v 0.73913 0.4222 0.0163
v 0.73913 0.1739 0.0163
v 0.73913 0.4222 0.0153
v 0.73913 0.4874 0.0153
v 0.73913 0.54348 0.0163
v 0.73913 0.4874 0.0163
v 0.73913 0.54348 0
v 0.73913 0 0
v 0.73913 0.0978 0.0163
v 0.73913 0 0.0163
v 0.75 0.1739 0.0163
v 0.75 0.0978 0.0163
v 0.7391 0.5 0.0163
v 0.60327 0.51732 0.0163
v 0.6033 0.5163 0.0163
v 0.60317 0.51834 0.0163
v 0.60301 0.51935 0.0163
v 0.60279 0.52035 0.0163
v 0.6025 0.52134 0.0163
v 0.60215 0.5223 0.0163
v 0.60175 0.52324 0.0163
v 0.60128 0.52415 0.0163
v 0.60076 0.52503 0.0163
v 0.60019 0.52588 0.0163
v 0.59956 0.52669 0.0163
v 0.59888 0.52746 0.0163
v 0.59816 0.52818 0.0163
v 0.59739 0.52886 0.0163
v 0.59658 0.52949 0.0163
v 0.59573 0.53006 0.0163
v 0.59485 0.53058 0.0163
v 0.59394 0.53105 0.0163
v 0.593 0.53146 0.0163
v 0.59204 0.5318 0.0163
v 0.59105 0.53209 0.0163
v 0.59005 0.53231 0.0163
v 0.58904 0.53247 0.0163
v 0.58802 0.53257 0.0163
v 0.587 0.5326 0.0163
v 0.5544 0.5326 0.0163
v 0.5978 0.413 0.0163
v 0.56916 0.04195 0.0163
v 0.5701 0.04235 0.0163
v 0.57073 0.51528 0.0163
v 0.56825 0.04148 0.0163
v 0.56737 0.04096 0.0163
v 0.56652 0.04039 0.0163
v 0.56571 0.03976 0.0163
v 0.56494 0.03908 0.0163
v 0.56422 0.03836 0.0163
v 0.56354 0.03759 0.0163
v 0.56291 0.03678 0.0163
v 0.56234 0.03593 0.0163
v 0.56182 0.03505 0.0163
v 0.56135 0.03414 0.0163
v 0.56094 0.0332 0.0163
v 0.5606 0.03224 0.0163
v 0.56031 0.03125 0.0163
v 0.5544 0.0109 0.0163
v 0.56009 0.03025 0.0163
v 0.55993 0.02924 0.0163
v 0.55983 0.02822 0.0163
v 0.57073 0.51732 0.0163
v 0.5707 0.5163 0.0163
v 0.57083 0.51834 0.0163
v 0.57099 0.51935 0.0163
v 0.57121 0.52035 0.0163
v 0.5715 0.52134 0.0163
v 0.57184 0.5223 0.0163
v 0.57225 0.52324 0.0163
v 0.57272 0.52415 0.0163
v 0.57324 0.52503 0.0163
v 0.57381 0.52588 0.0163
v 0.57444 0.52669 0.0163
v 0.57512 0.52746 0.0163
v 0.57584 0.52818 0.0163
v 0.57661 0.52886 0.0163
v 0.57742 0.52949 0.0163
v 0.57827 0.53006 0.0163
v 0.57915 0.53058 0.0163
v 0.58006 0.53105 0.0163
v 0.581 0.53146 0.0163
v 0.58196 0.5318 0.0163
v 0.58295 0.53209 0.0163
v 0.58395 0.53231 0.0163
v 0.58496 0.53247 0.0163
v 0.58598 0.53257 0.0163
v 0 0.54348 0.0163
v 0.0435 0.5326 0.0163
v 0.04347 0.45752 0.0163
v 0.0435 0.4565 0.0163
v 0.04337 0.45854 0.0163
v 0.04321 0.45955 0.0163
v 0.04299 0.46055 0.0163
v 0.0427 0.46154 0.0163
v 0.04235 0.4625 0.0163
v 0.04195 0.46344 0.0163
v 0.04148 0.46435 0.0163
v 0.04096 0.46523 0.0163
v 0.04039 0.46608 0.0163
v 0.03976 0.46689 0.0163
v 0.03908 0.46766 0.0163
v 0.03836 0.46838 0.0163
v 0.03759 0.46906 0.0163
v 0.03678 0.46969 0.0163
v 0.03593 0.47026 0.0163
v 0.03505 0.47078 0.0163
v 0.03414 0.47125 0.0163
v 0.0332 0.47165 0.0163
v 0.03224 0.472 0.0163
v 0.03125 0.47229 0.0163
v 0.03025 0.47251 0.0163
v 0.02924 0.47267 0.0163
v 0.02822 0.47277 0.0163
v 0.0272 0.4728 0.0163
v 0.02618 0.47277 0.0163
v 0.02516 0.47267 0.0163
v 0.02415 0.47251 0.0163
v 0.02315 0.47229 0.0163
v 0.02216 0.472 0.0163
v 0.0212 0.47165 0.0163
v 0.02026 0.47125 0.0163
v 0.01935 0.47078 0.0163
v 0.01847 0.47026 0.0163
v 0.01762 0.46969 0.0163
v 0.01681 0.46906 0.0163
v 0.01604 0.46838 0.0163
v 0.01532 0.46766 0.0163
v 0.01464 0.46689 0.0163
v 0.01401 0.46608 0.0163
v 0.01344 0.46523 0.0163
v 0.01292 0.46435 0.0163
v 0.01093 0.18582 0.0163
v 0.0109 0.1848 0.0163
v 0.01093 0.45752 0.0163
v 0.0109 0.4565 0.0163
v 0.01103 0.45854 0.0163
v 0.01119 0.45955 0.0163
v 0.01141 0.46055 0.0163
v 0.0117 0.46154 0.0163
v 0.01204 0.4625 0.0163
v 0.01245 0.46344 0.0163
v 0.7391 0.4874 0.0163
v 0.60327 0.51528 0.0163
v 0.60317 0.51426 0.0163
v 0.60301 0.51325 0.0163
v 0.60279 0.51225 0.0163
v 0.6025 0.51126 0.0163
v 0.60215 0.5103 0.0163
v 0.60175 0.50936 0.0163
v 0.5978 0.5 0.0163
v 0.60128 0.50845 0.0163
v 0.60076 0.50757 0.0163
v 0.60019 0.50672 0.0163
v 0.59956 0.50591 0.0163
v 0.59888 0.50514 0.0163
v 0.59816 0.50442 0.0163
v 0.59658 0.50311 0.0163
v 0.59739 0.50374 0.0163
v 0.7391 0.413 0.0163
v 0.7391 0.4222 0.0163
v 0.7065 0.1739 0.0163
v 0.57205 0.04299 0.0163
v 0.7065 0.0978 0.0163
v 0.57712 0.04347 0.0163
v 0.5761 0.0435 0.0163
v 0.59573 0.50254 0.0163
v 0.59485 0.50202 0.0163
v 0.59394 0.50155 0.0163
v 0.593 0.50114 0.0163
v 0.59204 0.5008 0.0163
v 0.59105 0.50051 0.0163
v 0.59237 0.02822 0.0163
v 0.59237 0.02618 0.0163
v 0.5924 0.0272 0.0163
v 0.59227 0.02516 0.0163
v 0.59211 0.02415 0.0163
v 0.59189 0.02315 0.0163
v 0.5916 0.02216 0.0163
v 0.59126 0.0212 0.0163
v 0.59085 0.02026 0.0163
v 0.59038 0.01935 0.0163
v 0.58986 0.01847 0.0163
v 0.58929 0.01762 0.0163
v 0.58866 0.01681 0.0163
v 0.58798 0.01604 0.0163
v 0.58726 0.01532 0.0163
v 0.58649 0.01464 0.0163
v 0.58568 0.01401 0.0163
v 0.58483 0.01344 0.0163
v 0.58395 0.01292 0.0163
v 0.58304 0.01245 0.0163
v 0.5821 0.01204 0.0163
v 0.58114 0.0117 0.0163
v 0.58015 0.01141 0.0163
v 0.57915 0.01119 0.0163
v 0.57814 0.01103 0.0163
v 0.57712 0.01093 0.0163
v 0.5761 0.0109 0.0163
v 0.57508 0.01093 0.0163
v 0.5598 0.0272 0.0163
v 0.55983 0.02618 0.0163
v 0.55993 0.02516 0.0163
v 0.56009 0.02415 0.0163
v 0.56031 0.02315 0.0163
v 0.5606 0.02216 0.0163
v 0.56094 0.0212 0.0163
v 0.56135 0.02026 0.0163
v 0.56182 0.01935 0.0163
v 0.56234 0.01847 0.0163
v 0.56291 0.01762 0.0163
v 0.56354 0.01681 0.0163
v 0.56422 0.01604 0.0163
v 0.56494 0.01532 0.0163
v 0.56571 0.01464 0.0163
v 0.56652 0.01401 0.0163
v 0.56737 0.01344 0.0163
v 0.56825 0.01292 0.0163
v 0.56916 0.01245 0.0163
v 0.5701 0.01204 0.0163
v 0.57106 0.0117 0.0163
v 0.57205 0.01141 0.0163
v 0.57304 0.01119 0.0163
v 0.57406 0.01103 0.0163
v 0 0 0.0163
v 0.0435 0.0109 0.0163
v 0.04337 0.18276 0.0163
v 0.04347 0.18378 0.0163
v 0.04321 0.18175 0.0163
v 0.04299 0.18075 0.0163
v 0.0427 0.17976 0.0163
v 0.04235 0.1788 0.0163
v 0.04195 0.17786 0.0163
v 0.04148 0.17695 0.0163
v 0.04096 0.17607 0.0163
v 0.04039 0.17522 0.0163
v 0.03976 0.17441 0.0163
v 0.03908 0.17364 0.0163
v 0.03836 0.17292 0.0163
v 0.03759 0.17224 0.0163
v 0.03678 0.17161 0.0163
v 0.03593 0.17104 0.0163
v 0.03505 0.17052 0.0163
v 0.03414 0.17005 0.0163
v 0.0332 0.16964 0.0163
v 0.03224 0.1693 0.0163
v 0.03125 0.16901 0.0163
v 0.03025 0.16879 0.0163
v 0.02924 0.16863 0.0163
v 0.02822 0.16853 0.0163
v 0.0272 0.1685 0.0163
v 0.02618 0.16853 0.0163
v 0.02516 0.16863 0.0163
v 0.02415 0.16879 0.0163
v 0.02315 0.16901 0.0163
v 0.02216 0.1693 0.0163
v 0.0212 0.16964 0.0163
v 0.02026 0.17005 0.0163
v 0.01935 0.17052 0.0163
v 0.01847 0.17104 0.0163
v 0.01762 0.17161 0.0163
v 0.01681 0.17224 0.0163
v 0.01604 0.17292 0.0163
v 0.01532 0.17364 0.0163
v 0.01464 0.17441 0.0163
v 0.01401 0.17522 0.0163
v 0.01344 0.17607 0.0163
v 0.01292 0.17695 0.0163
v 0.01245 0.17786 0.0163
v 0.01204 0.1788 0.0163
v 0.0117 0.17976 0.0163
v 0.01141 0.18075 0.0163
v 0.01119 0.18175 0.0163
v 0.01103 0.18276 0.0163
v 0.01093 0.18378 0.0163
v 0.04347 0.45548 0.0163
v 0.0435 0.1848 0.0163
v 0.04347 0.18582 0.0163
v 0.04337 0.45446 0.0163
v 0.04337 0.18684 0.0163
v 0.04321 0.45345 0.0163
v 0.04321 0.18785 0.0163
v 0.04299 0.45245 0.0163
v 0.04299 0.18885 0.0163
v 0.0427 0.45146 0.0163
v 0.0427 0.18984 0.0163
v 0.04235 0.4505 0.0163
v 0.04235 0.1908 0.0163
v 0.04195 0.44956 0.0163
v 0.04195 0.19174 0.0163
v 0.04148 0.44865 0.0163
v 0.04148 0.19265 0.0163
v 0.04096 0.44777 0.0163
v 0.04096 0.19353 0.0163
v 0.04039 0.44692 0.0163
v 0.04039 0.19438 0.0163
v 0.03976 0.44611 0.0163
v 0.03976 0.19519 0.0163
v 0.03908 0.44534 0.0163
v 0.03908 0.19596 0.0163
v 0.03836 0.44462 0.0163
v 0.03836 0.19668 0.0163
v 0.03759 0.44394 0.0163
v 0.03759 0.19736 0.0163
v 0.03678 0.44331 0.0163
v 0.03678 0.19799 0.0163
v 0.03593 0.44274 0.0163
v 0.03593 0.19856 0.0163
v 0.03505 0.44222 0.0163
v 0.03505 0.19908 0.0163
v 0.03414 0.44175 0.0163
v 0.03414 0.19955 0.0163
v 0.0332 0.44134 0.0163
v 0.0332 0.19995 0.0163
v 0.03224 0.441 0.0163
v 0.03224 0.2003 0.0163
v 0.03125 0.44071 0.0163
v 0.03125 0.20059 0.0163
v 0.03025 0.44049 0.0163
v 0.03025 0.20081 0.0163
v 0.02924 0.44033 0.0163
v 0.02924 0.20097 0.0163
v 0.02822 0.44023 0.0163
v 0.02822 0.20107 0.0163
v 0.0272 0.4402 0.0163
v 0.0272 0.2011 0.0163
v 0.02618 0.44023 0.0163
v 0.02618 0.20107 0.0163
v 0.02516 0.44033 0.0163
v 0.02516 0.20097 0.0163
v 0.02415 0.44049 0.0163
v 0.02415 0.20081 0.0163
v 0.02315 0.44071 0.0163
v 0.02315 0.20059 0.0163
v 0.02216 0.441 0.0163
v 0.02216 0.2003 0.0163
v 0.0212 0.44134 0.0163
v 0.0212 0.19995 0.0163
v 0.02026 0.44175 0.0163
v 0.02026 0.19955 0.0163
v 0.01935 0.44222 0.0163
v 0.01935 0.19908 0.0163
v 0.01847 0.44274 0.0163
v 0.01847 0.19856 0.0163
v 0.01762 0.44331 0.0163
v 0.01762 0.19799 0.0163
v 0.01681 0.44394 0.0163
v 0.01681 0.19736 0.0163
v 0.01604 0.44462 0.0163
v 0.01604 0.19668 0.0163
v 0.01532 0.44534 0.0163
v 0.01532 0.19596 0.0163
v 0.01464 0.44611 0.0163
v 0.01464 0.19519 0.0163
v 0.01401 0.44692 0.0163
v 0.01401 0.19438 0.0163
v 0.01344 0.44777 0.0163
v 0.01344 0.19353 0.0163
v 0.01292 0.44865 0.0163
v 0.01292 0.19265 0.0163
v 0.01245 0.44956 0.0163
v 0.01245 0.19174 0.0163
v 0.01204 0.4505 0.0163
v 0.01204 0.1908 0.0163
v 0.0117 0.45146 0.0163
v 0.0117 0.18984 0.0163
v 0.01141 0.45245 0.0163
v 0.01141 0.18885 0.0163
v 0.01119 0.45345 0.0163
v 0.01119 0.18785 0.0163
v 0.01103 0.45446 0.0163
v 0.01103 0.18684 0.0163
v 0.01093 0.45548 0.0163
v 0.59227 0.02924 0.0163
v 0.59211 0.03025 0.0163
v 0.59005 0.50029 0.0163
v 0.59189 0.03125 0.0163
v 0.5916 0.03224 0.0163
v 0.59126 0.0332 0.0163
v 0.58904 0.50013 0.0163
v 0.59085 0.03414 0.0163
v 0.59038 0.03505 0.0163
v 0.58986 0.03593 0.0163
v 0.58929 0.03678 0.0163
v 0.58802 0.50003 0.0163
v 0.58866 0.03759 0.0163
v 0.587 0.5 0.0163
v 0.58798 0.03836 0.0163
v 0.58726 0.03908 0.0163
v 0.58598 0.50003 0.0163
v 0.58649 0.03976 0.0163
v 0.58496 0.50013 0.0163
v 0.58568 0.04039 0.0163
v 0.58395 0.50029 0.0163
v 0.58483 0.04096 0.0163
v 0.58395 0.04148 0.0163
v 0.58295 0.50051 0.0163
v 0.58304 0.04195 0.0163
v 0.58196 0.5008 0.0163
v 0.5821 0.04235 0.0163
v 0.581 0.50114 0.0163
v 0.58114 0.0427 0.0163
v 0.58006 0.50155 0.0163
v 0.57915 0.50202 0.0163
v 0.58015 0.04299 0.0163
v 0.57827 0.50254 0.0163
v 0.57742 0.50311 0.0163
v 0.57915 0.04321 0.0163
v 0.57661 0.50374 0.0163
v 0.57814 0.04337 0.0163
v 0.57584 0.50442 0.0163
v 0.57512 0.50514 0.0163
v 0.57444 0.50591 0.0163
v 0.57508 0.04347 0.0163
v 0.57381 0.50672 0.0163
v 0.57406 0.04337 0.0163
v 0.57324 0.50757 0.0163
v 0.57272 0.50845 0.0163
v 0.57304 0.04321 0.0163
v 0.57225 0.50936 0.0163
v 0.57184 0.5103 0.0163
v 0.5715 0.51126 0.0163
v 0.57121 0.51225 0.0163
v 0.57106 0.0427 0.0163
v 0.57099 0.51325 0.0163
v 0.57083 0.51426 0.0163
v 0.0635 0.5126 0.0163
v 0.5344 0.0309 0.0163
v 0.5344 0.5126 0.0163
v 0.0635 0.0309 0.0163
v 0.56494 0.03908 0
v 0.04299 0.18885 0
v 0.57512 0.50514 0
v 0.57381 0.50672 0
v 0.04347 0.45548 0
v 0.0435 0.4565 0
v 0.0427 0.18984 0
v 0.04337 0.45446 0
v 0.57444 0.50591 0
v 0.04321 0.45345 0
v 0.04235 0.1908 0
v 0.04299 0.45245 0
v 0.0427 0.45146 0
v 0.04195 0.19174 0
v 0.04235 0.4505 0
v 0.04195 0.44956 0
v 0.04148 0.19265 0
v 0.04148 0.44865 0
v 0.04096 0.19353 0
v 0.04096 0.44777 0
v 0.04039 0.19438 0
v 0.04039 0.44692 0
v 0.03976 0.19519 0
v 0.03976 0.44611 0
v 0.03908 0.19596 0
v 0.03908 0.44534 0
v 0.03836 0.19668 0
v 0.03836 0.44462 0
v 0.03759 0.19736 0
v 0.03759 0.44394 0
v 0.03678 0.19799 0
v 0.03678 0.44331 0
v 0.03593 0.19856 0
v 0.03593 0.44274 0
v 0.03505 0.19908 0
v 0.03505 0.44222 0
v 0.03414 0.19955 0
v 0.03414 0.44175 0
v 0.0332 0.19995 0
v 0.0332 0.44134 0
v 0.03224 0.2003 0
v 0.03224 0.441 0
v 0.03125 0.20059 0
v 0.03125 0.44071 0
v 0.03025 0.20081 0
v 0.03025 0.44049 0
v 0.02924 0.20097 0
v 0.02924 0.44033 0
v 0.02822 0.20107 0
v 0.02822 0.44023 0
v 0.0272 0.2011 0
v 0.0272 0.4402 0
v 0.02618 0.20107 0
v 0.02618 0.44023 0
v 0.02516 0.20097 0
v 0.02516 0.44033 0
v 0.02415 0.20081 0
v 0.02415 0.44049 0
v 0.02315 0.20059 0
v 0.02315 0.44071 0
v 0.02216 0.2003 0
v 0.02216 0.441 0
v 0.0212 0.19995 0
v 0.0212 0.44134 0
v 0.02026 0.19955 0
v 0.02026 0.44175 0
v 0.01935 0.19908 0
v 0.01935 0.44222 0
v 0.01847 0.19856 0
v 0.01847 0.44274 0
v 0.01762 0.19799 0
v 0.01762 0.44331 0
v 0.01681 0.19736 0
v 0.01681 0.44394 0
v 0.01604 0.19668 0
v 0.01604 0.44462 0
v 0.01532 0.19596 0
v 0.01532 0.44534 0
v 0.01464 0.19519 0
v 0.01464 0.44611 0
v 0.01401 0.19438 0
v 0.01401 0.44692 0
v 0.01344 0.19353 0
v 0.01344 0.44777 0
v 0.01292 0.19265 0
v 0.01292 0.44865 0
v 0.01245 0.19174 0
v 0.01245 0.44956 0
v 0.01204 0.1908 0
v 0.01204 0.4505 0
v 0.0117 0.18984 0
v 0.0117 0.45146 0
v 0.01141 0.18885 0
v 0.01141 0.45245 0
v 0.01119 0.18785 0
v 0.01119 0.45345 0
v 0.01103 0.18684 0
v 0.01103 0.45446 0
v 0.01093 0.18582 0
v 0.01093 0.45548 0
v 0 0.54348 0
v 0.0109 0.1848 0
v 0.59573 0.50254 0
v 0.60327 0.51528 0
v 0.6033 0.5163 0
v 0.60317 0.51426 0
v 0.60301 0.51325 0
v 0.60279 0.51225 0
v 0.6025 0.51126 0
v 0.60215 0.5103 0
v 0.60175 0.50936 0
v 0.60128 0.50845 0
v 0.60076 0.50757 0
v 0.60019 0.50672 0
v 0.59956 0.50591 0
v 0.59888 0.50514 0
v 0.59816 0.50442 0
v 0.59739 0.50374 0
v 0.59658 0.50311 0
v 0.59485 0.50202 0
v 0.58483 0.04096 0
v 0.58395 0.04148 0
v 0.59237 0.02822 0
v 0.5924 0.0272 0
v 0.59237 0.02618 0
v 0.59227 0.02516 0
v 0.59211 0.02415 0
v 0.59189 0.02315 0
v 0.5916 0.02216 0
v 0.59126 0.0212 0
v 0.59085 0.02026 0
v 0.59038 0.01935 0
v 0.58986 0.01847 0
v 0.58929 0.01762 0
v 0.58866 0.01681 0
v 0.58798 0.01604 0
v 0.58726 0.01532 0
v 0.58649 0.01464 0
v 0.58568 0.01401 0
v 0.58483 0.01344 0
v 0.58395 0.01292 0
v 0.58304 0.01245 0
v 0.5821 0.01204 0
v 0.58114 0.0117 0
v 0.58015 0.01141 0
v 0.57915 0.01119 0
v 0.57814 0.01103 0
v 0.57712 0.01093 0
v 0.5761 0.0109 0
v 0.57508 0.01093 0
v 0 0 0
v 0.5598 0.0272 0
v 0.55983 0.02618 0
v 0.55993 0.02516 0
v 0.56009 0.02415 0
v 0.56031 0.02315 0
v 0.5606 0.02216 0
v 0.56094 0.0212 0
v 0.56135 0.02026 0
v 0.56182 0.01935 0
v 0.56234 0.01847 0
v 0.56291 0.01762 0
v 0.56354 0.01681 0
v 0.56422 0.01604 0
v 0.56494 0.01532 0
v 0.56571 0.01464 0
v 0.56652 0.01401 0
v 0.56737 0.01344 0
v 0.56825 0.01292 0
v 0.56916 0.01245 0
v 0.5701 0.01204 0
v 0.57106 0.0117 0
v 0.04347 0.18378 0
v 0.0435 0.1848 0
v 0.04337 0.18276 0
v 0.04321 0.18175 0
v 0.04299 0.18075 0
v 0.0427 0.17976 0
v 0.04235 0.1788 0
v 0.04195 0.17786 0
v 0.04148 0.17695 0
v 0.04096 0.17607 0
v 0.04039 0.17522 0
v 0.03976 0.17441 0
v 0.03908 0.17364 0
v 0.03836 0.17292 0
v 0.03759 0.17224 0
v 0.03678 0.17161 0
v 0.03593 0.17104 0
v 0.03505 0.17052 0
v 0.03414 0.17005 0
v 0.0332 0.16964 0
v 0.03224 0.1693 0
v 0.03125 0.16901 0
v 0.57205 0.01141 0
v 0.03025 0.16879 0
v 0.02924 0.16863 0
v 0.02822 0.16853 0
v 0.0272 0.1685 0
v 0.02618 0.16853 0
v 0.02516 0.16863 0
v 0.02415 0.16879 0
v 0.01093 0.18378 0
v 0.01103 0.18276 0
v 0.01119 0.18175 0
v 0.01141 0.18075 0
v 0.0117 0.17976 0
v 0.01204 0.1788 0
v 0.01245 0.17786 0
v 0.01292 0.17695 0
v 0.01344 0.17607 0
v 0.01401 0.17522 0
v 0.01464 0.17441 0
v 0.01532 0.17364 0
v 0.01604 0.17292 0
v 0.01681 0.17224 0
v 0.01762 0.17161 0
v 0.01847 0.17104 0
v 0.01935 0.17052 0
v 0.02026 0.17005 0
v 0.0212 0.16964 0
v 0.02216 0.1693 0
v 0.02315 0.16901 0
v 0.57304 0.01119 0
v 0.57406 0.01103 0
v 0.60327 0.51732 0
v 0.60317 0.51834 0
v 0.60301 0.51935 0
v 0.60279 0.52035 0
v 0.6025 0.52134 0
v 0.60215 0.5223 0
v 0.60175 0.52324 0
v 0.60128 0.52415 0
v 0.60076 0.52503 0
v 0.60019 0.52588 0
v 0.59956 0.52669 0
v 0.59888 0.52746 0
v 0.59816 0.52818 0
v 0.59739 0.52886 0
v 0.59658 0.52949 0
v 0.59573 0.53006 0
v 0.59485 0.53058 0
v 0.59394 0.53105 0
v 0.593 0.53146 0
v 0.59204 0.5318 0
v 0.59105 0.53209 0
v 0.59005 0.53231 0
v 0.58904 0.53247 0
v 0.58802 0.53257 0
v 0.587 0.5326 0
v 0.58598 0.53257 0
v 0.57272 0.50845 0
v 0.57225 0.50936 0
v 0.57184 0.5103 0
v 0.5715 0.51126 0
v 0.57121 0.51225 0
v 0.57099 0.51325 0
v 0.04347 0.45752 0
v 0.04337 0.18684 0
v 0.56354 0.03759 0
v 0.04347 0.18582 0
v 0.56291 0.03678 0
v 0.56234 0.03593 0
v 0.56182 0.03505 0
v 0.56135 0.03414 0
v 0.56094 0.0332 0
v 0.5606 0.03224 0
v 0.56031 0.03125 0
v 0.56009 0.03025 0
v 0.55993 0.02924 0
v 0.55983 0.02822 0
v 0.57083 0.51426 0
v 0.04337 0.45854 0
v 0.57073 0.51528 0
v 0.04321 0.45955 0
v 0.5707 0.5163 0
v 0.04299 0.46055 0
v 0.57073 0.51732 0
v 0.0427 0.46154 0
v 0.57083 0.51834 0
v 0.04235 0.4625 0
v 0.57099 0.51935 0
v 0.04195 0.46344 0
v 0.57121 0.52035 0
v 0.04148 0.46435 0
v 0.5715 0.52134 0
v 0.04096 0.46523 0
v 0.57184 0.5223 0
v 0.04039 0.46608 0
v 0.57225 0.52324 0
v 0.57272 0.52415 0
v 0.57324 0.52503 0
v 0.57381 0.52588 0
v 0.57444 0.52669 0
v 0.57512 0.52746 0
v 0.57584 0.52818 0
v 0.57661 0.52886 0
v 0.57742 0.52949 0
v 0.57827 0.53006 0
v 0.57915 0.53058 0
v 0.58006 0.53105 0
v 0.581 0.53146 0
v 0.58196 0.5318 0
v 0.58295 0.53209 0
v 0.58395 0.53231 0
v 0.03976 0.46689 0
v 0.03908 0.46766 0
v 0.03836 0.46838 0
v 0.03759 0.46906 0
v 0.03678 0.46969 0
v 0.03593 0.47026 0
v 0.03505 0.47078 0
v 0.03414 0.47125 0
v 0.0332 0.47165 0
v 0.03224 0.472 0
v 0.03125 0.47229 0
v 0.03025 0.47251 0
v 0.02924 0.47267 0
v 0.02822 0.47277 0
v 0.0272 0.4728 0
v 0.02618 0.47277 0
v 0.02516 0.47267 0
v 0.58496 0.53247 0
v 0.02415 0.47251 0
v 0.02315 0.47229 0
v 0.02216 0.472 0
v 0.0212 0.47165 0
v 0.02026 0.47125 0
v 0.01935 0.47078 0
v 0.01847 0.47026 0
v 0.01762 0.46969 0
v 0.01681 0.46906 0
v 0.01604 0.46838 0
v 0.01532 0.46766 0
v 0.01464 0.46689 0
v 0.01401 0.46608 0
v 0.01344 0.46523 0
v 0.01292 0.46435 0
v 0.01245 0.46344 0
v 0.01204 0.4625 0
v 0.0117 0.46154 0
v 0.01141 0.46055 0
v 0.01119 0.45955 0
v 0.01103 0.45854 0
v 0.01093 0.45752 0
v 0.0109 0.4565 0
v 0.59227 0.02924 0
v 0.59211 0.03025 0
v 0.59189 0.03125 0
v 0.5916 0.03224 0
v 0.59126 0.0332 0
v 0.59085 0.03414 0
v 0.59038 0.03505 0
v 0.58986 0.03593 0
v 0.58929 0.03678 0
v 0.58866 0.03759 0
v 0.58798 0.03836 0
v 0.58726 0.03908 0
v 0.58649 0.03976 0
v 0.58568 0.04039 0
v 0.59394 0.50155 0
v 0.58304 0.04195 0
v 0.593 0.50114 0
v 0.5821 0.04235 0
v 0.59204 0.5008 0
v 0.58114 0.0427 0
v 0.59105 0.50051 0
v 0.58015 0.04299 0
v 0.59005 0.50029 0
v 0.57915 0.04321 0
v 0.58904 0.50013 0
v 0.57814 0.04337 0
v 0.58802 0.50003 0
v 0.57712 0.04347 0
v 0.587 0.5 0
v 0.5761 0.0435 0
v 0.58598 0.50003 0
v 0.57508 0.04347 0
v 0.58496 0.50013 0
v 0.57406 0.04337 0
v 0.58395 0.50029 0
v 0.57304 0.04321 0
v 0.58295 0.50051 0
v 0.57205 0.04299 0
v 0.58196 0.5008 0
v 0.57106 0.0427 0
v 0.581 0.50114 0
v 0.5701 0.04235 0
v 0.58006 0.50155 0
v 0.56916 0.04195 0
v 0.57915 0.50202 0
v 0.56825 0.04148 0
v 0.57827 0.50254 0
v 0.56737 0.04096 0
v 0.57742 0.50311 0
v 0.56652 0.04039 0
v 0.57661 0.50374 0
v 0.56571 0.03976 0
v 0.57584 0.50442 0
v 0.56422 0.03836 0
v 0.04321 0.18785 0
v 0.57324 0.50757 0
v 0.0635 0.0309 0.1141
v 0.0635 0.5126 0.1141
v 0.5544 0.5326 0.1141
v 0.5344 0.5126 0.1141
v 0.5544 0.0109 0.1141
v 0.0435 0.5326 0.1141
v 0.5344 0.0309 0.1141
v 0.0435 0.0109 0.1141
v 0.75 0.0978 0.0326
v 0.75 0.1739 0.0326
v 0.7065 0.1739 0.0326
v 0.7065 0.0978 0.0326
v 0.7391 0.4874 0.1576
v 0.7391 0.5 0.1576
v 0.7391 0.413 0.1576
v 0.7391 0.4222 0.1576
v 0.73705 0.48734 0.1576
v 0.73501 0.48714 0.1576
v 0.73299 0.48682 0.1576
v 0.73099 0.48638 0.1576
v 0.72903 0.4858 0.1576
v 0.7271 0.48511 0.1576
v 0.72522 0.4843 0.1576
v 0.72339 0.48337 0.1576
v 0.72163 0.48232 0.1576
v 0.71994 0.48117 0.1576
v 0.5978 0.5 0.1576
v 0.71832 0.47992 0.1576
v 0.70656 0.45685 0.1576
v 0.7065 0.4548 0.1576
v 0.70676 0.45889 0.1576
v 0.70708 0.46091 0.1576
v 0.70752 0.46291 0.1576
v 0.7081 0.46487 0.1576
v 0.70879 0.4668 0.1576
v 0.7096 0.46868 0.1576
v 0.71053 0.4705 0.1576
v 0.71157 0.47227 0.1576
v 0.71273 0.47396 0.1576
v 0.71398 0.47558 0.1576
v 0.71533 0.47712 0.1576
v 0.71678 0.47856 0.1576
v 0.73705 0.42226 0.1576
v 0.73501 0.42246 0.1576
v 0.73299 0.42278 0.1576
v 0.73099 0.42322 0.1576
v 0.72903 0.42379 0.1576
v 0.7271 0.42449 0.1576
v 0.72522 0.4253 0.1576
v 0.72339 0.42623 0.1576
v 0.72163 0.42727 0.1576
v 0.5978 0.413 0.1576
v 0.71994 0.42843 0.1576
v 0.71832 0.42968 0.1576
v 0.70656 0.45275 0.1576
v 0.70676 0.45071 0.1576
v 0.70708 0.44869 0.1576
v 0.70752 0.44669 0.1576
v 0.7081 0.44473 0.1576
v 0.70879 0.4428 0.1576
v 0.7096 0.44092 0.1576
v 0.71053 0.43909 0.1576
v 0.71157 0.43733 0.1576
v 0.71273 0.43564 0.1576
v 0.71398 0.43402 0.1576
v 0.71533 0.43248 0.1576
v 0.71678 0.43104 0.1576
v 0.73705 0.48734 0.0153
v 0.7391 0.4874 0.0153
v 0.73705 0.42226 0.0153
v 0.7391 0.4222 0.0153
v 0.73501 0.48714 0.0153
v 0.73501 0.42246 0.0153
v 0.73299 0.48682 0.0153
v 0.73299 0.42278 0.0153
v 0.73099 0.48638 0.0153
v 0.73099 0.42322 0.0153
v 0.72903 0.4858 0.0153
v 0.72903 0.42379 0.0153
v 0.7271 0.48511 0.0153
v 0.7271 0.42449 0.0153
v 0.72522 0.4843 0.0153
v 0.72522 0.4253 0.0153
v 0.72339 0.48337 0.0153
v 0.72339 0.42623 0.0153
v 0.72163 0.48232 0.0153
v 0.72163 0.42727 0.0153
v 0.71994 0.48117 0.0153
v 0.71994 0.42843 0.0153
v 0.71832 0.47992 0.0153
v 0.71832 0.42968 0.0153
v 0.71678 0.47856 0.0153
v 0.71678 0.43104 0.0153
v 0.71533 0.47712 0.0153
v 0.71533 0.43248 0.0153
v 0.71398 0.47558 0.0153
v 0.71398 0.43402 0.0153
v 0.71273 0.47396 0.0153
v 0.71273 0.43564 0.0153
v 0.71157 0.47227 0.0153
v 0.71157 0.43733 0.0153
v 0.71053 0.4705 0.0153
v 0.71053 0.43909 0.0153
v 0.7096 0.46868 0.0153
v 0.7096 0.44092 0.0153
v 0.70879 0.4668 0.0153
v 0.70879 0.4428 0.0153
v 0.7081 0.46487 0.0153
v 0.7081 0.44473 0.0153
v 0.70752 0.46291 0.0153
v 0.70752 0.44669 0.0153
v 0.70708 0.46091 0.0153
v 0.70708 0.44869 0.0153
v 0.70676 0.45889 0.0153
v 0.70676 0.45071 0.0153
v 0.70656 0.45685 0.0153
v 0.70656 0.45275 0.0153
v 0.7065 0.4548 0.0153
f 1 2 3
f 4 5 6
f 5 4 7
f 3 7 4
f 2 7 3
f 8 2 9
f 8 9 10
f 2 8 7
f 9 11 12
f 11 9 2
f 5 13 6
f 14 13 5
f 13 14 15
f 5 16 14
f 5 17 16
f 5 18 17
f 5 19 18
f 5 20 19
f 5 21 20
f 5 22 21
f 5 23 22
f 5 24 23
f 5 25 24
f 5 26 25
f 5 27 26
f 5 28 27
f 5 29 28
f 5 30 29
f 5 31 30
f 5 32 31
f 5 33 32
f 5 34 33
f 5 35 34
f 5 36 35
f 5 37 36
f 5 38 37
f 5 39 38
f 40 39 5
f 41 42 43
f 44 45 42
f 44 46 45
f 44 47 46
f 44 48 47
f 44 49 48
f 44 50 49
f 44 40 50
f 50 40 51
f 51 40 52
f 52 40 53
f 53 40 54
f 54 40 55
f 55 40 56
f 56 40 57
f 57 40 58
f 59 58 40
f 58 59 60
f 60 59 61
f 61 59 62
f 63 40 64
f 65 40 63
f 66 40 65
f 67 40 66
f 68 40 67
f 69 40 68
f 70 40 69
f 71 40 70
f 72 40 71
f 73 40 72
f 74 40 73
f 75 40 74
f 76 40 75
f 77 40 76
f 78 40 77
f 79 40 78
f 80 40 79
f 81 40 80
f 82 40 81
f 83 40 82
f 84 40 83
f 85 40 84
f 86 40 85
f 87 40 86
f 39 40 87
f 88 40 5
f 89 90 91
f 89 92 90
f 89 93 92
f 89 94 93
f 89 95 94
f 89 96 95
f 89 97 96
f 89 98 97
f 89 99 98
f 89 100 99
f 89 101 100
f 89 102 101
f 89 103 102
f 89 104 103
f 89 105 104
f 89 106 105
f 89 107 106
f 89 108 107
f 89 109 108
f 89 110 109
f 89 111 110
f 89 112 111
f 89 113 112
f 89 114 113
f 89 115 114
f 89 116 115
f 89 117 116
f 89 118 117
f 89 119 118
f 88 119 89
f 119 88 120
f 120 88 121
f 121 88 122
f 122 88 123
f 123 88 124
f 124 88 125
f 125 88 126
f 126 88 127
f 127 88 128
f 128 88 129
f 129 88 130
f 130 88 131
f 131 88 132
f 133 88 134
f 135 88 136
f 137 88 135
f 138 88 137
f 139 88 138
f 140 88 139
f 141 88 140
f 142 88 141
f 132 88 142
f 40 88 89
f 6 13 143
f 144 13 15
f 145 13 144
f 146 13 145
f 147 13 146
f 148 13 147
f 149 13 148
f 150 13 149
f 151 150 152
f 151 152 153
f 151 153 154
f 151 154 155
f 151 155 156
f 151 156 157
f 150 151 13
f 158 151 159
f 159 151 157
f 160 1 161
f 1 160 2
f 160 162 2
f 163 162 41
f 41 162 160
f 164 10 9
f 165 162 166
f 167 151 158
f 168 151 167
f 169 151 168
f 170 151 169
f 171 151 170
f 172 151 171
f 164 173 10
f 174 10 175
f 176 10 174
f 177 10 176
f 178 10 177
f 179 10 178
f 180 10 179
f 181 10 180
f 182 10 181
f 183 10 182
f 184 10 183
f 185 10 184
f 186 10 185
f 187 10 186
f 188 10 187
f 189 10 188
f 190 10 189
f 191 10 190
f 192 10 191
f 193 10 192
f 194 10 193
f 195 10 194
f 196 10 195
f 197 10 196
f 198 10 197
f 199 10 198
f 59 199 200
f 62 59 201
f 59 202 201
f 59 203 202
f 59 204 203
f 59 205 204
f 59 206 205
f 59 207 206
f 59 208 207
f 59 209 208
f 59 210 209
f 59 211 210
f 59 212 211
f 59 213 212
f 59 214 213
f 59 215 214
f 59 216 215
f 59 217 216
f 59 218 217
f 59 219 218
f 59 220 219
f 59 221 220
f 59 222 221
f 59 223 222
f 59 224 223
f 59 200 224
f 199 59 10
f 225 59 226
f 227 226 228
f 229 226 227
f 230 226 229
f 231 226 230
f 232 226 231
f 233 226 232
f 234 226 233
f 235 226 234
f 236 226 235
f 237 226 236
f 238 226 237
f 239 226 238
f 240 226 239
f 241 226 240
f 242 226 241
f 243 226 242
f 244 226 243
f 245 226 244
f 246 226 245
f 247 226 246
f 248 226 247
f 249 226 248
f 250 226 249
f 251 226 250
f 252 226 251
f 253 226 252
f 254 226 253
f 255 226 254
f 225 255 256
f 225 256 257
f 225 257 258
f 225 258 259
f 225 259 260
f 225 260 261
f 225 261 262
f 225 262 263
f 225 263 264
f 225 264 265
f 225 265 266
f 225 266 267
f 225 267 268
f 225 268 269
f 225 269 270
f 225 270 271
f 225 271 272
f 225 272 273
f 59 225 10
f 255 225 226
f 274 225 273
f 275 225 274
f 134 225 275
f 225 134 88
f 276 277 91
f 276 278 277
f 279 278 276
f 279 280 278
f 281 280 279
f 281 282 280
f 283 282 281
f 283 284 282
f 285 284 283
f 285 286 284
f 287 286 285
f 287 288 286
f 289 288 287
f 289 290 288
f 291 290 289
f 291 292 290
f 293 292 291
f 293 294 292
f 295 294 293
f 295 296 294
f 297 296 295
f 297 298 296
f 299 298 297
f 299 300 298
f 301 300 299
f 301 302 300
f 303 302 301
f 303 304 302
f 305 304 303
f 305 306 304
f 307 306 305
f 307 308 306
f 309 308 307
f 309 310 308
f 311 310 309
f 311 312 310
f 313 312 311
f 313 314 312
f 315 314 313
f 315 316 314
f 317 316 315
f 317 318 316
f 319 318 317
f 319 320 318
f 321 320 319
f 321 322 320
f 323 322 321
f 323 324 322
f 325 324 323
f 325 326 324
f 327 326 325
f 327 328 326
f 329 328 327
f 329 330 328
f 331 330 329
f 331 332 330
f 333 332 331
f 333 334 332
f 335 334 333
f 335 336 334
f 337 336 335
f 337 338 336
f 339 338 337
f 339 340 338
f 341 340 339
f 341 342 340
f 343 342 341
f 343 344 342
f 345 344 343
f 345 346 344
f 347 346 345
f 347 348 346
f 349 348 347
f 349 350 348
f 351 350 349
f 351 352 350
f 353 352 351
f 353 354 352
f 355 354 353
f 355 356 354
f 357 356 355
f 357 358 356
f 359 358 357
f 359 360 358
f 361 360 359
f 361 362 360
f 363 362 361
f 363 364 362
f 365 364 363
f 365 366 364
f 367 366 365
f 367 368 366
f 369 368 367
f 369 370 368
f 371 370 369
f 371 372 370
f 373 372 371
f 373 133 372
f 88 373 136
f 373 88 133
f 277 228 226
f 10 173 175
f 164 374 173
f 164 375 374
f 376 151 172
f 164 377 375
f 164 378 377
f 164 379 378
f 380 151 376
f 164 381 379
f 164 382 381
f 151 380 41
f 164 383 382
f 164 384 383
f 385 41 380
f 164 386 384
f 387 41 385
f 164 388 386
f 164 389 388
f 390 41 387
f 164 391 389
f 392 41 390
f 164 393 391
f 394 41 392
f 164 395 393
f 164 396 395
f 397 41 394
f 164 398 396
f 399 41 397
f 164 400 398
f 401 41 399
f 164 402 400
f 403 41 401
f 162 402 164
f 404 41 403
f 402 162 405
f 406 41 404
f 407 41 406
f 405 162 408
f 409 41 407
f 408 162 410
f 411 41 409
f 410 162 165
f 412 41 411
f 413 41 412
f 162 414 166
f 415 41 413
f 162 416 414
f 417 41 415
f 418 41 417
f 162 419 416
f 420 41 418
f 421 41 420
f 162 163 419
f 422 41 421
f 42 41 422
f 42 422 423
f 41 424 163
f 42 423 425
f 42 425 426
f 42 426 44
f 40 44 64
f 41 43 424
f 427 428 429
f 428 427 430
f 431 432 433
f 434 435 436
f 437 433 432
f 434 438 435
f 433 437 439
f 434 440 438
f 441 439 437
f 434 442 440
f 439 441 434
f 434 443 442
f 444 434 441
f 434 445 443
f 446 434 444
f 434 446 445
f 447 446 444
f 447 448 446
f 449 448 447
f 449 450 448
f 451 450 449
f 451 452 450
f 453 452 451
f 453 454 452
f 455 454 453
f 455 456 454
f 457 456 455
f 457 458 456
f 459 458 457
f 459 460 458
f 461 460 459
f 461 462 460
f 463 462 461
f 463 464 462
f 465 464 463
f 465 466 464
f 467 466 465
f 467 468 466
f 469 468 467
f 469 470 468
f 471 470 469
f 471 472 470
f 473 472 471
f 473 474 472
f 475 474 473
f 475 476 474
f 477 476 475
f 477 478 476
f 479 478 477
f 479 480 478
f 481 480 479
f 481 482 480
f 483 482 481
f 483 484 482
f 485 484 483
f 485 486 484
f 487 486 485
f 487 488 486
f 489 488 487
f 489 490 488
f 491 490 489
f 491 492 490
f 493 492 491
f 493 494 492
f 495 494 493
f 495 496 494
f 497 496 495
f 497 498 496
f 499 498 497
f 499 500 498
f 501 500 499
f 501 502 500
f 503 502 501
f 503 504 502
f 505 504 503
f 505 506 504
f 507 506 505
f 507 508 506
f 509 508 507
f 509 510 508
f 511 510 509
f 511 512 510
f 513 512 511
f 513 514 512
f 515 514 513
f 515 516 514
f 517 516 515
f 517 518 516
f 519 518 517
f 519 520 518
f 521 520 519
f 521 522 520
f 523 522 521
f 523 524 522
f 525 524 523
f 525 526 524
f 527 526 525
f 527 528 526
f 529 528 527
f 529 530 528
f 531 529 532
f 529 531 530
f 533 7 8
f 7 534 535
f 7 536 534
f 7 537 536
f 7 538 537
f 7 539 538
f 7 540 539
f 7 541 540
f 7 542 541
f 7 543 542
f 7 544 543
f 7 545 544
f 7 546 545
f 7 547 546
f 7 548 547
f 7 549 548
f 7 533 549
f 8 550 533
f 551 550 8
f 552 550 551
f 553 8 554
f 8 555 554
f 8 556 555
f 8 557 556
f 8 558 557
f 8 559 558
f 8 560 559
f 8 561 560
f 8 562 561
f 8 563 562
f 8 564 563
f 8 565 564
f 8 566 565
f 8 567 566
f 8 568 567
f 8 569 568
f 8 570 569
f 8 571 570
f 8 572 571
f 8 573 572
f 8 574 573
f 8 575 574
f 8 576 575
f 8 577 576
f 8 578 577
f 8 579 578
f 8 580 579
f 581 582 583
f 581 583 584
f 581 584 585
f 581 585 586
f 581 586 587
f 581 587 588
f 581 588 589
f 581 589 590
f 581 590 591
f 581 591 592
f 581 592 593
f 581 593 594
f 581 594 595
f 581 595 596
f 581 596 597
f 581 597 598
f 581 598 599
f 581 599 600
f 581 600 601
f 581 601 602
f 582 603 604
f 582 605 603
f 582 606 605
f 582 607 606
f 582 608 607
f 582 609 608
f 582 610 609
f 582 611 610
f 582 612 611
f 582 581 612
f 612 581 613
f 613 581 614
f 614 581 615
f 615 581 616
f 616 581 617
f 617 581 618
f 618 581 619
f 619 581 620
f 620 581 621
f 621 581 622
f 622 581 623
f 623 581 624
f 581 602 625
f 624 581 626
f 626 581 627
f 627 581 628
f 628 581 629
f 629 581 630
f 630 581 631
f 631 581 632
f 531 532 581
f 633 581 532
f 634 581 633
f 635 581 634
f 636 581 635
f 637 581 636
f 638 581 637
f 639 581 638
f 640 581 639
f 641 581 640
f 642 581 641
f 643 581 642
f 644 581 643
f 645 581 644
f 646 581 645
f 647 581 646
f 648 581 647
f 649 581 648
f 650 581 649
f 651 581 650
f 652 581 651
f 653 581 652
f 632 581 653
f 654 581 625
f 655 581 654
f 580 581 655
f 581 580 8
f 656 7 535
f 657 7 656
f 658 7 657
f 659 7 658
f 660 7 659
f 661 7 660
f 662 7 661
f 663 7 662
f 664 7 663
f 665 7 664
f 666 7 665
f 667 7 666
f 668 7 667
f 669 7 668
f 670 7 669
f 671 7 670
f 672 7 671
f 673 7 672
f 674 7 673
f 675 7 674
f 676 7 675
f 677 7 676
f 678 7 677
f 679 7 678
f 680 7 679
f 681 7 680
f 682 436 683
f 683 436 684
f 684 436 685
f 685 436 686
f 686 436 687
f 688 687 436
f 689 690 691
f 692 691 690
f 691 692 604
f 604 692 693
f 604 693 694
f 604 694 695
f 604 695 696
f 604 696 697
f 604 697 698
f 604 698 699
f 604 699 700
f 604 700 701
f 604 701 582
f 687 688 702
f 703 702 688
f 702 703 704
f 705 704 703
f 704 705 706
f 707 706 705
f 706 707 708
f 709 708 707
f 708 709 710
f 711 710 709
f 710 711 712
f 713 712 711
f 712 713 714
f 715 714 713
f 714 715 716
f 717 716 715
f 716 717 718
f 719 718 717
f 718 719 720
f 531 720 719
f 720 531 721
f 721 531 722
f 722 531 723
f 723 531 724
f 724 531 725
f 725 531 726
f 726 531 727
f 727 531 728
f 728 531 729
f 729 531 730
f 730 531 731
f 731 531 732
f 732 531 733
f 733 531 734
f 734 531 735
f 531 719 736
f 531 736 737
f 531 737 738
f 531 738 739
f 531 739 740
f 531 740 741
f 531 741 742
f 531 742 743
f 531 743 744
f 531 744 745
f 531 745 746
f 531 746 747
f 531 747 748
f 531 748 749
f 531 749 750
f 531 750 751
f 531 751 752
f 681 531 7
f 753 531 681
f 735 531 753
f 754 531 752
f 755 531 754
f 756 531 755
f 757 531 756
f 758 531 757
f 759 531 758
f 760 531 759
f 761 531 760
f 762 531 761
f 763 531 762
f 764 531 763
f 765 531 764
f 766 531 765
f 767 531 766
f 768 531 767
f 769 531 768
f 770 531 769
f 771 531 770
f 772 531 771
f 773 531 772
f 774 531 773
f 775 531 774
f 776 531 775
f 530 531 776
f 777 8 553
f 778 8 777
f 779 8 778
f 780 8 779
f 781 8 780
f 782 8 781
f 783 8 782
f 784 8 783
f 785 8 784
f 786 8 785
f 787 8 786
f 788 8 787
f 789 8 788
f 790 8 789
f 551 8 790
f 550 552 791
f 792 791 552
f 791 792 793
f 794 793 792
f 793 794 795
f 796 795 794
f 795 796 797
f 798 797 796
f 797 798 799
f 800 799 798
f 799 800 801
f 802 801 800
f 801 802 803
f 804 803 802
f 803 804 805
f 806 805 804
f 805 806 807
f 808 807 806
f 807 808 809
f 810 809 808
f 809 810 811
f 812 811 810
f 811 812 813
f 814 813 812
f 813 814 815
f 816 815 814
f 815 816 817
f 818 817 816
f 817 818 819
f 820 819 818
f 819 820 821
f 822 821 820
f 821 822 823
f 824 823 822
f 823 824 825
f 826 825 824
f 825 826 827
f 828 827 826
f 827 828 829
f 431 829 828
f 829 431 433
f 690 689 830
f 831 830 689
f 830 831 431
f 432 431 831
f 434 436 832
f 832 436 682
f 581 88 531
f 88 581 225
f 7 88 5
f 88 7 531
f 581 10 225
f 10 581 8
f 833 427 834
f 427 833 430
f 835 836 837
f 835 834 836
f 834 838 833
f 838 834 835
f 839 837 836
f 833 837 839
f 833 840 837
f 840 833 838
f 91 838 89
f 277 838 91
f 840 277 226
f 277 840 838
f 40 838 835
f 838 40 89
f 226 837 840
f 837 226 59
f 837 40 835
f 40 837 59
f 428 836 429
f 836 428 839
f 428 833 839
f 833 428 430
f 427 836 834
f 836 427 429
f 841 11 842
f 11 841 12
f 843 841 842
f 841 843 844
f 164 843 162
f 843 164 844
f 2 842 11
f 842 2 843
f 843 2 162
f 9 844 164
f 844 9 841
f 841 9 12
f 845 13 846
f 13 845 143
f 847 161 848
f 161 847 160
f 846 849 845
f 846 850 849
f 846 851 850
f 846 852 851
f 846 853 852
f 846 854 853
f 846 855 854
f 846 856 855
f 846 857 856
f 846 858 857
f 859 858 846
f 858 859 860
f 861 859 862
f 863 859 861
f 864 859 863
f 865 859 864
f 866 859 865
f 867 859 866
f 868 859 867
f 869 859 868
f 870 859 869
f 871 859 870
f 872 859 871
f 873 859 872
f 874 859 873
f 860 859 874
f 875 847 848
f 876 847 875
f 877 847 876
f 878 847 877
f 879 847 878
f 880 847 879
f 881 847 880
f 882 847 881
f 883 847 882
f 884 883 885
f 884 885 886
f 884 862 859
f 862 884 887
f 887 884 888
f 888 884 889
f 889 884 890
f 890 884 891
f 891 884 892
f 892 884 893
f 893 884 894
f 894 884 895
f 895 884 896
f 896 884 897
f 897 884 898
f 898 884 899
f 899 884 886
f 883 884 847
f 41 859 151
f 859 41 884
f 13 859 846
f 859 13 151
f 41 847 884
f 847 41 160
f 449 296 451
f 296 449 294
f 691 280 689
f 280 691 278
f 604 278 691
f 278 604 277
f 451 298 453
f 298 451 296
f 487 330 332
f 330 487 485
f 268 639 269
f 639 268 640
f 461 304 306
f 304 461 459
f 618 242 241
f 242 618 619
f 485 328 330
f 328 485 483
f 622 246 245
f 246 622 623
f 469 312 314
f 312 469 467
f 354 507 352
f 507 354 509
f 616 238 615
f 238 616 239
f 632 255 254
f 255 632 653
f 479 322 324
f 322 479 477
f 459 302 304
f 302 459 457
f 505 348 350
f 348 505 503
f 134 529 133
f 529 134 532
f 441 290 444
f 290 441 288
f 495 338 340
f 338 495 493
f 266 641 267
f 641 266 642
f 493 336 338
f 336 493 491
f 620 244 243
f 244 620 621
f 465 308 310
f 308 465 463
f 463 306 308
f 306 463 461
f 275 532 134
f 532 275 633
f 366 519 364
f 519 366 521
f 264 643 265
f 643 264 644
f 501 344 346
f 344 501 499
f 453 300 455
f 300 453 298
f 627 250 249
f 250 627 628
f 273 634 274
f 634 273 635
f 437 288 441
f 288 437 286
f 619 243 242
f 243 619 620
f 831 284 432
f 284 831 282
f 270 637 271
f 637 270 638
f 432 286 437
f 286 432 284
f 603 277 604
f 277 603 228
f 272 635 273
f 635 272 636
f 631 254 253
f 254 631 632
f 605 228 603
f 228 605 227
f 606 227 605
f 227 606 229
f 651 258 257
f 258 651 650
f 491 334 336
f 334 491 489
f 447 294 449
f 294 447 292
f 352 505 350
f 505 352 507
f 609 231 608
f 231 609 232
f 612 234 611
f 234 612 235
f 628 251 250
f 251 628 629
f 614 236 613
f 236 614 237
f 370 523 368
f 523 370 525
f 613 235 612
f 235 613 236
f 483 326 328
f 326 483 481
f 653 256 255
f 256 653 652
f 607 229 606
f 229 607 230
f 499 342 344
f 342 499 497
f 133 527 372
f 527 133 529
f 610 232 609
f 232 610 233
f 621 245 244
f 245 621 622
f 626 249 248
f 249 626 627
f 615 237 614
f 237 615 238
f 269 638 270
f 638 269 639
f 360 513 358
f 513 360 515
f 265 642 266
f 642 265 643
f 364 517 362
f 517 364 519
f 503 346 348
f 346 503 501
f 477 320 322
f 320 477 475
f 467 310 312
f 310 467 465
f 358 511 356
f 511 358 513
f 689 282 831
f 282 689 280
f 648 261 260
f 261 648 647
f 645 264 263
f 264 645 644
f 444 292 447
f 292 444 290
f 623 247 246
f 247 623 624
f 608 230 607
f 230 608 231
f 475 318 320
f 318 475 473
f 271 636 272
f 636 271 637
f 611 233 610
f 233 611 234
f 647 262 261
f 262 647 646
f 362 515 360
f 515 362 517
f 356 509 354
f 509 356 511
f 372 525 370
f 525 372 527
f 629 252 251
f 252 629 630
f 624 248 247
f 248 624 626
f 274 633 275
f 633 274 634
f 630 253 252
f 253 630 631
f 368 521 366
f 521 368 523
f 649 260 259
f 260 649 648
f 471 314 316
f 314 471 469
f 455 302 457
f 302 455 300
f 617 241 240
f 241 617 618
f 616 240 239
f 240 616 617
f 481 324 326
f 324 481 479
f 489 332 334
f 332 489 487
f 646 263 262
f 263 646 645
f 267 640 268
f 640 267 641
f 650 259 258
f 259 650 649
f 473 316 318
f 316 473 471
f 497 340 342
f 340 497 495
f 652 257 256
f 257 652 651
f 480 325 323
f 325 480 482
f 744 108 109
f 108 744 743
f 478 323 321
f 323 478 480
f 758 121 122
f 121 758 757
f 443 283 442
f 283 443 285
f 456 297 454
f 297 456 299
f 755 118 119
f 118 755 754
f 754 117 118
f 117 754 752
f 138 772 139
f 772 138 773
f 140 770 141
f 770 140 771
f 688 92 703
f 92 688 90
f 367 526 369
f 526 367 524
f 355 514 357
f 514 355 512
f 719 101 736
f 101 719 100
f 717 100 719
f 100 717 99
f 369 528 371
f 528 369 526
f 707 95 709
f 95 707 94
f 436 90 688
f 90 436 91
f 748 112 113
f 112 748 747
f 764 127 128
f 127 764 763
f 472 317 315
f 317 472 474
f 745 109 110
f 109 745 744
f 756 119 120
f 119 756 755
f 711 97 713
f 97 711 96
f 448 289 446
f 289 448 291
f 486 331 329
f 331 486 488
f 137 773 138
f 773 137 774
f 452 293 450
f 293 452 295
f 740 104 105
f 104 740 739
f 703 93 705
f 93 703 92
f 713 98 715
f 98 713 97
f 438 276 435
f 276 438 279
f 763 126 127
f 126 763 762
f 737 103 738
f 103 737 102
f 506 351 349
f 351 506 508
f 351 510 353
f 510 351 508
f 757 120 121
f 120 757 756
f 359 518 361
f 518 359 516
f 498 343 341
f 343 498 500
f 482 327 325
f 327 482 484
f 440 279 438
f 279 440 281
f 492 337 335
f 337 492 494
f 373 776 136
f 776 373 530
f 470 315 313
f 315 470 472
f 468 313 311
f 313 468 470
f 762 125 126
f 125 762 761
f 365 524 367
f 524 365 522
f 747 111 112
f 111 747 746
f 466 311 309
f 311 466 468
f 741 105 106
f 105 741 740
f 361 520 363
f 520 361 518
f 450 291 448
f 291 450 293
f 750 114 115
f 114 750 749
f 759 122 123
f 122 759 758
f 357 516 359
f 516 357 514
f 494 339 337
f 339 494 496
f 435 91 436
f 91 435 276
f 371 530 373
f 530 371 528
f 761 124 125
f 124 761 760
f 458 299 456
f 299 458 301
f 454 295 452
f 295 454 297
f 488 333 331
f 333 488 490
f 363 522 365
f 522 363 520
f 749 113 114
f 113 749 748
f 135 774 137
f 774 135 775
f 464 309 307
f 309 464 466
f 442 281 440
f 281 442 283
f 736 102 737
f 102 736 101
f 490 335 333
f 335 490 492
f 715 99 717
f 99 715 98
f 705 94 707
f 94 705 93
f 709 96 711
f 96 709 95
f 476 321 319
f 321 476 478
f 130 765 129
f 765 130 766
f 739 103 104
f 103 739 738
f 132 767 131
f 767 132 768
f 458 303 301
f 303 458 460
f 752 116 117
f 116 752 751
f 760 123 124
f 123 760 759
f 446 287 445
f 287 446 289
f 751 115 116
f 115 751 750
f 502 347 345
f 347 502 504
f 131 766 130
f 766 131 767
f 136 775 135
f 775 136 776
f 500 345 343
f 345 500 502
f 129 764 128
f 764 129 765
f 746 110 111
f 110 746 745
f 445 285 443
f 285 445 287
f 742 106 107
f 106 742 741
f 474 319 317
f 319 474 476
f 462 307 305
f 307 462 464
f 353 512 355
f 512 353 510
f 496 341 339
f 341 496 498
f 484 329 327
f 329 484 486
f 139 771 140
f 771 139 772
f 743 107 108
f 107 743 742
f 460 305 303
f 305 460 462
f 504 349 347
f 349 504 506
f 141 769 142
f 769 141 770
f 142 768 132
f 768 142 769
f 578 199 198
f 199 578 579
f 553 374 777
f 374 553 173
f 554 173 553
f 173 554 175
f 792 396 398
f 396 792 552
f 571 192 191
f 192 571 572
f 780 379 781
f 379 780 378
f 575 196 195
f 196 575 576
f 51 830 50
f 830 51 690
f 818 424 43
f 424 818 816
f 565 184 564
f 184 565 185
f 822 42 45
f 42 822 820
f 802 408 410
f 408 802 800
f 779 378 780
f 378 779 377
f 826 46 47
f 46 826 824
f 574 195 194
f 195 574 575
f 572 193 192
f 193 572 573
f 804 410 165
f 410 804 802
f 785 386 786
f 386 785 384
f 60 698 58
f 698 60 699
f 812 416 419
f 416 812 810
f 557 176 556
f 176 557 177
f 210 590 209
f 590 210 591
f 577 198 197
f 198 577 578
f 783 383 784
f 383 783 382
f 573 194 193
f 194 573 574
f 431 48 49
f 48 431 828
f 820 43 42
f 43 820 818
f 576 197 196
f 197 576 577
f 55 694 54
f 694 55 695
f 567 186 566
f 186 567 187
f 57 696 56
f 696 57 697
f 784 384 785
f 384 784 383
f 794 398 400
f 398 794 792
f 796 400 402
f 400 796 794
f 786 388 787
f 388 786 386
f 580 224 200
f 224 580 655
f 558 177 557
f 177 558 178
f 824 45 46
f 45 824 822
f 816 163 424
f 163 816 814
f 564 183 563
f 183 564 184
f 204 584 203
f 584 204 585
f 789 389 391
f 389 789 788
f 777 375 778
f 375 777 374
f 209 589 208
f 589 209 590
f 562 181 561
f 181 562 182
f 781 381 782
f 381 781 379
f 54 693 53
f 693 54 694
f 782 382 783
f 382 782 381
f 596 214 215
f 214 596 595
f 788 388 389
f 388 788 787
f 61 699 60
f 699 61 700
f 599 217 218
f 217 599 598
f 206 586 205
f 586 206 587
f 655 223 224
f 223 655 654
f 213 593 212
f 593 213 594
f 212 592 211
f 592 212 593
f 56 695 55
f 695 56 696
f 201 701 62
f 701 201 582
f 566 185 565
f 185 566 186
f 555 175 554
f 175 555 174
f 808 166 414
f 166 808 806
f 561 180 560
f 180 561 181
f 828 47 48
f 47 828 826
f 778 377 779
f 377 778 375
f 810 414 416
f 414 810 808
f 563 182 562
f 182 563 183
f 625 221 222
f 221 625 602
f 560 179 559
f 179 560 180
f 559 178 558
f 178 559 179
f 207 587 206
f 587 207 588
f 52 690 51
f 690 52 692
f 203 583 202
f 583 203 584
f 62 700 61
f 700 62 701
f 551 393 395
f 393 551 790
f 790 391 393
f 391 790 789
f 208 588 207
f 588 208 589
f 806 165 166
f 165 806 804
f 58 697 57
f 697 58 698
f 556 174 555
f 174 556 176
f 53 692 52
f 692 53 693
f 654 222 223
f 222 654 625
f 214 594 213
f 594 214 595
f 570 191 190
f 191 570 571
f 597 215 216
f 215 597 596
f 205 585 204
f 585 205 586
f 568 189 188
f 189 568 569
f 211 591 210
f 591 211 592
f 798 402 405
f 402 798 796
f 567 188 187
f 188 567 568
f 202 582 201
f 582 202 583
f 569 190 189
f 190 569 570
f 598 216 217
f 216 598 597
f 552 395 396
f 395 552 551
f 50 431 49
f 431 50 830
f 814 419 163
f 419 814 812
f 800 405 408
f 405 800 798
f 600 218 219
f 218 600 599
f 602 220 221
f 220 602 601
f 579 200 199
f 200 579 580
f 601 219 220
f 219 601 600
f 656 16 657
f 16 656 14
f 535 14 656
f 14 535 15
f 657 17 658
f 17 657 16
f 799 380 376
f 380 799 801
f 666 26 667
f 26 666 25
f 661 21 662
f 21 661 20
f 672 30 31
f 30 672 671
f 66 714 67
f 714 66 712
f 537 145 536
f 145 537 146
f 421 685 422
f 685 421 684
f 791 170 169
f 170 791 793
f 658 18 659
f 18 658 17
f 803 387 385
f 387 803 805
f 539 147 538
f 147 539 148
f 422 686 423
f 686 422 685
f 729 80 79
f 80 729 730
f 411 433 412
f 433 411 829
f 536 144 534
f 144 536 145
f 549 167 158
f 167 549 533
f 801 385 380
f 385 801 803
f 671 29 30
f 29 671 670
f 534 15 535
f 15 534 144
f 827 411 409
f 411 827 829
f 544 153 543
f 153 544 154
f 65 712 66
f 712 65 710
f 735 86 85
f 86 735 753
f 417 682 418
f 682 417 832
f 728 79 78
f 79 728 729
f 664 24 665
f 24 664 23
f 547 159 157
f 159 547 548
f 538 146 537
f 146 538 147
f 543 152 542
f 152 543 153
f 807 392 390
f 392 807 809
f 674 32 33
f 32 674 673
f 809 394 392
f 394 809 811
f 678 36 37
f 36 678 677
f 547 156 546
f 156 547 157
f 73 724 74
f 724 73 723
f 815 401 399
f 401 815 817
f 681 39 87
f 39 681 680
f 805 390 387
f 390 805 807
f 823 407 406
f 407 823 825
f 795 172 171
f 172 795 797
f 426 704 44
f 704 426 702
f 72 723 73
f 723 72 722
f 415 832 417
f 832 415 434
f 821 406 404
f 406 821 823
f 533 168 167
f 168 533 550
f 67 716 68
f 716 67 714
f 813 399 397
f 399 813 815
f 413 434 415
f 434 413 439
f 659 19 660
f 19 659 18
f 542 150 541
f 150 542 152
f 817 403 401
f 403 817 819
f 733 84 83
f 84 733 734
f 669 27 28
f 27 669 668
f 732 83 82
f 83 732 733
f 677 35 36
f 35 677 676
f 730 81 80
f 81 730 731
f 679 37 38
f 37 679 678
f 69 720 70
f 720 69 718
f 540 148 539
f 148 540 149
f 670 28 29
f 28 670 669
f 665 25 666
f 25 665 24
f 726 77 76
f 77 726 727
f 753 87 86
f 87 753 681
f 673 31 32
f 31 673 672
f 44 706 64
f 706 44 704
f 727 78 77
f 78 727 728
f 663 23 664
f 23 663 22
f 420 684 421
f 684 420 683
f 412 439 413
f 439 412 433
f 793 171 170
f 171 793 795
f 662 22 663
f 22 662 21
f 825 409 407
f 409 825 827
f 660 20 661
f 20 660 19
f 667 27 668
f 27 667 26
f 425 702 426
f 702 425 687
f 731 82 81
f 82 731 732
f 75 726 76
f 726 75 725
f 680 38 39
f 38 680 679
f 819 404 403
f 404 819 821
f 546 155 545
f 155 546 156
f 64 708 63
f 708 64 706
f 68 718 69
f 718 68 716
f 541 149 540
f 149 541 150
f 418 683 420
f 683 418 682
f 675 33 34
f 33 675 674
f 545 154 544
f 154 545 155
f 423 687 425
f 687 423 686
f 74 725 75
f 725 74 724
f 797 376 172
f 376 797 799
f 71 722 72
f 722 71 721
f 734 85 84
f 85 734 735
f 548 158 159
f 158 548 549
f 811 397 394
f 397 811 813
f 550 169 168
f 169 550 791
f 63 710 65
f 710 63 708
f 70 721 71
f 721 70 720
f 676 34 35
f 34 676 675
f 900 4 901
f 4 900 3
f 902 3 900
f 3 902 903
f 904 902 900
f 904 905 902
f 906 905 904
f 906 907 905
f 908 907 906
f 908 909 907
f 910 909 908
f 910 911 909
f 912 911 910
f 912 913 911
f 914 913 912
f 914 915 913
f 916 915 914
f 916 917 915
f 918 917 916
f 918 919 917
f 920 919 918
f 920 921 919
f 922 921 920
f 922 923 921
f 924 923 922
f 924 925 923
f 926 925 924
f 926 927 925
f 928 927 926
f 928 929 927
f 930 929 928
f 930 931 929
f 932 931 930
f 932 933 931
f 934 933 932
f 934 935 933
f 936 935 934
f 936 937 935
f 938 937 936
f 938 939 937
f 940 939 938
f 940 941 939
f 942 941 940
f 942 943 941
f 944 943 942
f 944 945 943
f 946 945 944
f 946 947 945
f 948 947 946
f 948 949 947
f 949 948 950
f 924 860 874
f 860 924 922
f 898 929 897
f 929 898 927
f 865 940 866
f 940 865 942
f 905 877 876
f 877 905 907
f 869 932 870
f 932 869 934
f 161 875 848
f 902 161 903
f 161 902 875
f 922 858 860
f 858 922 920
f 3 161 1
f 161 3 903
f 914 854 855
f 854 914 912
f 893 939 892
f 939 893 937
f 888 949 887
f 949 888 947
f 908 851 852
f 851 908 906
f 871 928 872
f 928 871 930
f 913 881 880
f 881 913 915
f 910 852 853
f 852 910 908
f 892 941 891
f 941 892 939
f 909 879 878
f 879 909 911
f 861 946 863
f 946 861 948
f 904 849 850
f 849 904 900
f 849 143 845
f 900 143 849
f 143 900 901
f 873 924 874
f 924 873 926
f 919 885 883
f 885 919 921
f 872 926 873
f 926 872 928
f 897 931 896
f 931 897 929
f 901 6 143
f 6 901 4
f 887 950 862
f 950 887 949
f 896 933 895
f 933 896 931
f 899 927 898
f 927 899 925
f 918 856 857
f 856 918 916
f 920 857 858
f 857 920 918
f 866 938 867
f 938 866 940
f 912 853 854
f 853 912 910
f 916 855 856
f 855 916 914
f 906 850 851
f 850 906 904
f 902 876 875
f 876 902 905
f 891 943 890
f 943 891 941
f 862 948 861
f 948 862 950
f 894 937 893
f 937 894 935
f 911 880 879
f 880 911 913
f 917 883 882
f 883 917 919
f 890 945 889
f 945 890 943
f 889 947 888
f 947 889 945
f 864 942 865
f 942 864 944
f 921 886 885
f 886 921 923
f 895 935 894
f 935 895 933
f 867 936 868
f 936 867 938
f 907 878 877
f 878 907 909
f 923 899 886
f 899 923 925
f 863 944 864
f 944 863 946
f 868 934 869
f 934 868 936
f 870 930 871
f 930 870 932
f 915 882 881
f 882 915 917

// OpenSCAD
// Global Resolution Setting
$fn = 100;

// --------------------------
// Parametric Dimension Definitions
// --------------------------
// Base Plate Parameters
base_length = 0.73913;
base_width = 0.543478;
base_height = 0.016304;

// Base Mount Hole Parameters
base_hole_radius = 0.0163;
base_hole_centers = [
    [0.0272, 0.1848],   // Hole 1: Left front
    [0.0272, 0.4565],   // Hole 2: Left rear
    [0.5761, 0.0272],   // Hole 3: Right front
    [0.587, 0.5163]     // Hole 4: Right rear
];

// Raised Rail Frame Parameters
rail_left_offset = 0.0435;
rail_front_offset = 0.0109;
rail_span_x = 0.5109;
rail_span_y = 0.5217;
rail_raised_height = 0.0978;
rail_thickness = 0.02; // Uniform rib thickness

// Shallow Surface Tab Parameters
tab_left_offset = 0.7065;
tab_front_offset = 0.0978;
tab_size_x = 0.0435;
tab_size_y = 0.0761;
tab_height = 0.0163;

// Deep Side Block Parameters
block_left_offset = 0.5978;
block_front_offset = 0.413;
block_size_x = 0.1413;
block_size_y = 0.087;
block_raised_height = 0.1413;
block_hole_radius = 0.0326;
block_hole_center = [0.7391, 0.4548];

// --------------------------
// Main Model Construction
// --------------------------
difference() {
    // Union of all positive solid features
    union() {
        // 1. Base plate
        cube([base_length, base_width, base_height], center=false);

        // 2. Raised rail frame (four separate ribs, no infill)
        rail_x0 = rail_left_offset;
        rail_x1 = rail_left_offset + rail_span_x;
        rail_y0 = rail_front_offset;
        rail_y1 = rail_front_offset + rail_span_y;
        // Left rib
        translate([rail_x0, rail_y0, base_height])
            cube([rail_thickness, rail_span_y, rail_raised_height]);
        // Right rib
        translate([rail_x1 - rail_thickness, rail_y0, base_height])
            cube([rail_thickness, rail_span_y, rail_raised_height]);
        // Front rib
        translate([rail_x0 + rail_thickness, rail_y0, base_height])
            cube([rail_span_x - 2*rail_thickness, rail_thickness, rail_raised_height]);
        // Rear rib
        translate([rail_x0 + rail_thickness, rail_y1 - rail_thickness, base_height])
            cube([rail_span_x - 2*rail_thickness, rail_thickness, rail_raised_height]);

        // 3. Shallow surface tab
        translate([tab_left_offset, tab_front_offset, base_height])
            cube([tab_size_x, tab_size_y, tab_height]);

        // 4. Deep side block
        translate([block_left_offset, block_front_offset, base_height])
            cube([block_size_x, block_size_y, block_raised_height]);
    }

    // --------------------------
    // Cut all through holes
    // --------------------------
    // Base plate mounting holes
    for (hc = base_hole_centers) {
        translate([hc[0], hc[1], -0.001])
            cylinder(h=base_height + 0.002, r=base_hole_radius, center=false);
    }

    // Deep block through hole
    translate([block_hole_center[0], block_hole_center[1], base_height - 0.001])
        cylinder(h=block_raised_height + 0.002, r=block_hole_radius, center=false);
}
